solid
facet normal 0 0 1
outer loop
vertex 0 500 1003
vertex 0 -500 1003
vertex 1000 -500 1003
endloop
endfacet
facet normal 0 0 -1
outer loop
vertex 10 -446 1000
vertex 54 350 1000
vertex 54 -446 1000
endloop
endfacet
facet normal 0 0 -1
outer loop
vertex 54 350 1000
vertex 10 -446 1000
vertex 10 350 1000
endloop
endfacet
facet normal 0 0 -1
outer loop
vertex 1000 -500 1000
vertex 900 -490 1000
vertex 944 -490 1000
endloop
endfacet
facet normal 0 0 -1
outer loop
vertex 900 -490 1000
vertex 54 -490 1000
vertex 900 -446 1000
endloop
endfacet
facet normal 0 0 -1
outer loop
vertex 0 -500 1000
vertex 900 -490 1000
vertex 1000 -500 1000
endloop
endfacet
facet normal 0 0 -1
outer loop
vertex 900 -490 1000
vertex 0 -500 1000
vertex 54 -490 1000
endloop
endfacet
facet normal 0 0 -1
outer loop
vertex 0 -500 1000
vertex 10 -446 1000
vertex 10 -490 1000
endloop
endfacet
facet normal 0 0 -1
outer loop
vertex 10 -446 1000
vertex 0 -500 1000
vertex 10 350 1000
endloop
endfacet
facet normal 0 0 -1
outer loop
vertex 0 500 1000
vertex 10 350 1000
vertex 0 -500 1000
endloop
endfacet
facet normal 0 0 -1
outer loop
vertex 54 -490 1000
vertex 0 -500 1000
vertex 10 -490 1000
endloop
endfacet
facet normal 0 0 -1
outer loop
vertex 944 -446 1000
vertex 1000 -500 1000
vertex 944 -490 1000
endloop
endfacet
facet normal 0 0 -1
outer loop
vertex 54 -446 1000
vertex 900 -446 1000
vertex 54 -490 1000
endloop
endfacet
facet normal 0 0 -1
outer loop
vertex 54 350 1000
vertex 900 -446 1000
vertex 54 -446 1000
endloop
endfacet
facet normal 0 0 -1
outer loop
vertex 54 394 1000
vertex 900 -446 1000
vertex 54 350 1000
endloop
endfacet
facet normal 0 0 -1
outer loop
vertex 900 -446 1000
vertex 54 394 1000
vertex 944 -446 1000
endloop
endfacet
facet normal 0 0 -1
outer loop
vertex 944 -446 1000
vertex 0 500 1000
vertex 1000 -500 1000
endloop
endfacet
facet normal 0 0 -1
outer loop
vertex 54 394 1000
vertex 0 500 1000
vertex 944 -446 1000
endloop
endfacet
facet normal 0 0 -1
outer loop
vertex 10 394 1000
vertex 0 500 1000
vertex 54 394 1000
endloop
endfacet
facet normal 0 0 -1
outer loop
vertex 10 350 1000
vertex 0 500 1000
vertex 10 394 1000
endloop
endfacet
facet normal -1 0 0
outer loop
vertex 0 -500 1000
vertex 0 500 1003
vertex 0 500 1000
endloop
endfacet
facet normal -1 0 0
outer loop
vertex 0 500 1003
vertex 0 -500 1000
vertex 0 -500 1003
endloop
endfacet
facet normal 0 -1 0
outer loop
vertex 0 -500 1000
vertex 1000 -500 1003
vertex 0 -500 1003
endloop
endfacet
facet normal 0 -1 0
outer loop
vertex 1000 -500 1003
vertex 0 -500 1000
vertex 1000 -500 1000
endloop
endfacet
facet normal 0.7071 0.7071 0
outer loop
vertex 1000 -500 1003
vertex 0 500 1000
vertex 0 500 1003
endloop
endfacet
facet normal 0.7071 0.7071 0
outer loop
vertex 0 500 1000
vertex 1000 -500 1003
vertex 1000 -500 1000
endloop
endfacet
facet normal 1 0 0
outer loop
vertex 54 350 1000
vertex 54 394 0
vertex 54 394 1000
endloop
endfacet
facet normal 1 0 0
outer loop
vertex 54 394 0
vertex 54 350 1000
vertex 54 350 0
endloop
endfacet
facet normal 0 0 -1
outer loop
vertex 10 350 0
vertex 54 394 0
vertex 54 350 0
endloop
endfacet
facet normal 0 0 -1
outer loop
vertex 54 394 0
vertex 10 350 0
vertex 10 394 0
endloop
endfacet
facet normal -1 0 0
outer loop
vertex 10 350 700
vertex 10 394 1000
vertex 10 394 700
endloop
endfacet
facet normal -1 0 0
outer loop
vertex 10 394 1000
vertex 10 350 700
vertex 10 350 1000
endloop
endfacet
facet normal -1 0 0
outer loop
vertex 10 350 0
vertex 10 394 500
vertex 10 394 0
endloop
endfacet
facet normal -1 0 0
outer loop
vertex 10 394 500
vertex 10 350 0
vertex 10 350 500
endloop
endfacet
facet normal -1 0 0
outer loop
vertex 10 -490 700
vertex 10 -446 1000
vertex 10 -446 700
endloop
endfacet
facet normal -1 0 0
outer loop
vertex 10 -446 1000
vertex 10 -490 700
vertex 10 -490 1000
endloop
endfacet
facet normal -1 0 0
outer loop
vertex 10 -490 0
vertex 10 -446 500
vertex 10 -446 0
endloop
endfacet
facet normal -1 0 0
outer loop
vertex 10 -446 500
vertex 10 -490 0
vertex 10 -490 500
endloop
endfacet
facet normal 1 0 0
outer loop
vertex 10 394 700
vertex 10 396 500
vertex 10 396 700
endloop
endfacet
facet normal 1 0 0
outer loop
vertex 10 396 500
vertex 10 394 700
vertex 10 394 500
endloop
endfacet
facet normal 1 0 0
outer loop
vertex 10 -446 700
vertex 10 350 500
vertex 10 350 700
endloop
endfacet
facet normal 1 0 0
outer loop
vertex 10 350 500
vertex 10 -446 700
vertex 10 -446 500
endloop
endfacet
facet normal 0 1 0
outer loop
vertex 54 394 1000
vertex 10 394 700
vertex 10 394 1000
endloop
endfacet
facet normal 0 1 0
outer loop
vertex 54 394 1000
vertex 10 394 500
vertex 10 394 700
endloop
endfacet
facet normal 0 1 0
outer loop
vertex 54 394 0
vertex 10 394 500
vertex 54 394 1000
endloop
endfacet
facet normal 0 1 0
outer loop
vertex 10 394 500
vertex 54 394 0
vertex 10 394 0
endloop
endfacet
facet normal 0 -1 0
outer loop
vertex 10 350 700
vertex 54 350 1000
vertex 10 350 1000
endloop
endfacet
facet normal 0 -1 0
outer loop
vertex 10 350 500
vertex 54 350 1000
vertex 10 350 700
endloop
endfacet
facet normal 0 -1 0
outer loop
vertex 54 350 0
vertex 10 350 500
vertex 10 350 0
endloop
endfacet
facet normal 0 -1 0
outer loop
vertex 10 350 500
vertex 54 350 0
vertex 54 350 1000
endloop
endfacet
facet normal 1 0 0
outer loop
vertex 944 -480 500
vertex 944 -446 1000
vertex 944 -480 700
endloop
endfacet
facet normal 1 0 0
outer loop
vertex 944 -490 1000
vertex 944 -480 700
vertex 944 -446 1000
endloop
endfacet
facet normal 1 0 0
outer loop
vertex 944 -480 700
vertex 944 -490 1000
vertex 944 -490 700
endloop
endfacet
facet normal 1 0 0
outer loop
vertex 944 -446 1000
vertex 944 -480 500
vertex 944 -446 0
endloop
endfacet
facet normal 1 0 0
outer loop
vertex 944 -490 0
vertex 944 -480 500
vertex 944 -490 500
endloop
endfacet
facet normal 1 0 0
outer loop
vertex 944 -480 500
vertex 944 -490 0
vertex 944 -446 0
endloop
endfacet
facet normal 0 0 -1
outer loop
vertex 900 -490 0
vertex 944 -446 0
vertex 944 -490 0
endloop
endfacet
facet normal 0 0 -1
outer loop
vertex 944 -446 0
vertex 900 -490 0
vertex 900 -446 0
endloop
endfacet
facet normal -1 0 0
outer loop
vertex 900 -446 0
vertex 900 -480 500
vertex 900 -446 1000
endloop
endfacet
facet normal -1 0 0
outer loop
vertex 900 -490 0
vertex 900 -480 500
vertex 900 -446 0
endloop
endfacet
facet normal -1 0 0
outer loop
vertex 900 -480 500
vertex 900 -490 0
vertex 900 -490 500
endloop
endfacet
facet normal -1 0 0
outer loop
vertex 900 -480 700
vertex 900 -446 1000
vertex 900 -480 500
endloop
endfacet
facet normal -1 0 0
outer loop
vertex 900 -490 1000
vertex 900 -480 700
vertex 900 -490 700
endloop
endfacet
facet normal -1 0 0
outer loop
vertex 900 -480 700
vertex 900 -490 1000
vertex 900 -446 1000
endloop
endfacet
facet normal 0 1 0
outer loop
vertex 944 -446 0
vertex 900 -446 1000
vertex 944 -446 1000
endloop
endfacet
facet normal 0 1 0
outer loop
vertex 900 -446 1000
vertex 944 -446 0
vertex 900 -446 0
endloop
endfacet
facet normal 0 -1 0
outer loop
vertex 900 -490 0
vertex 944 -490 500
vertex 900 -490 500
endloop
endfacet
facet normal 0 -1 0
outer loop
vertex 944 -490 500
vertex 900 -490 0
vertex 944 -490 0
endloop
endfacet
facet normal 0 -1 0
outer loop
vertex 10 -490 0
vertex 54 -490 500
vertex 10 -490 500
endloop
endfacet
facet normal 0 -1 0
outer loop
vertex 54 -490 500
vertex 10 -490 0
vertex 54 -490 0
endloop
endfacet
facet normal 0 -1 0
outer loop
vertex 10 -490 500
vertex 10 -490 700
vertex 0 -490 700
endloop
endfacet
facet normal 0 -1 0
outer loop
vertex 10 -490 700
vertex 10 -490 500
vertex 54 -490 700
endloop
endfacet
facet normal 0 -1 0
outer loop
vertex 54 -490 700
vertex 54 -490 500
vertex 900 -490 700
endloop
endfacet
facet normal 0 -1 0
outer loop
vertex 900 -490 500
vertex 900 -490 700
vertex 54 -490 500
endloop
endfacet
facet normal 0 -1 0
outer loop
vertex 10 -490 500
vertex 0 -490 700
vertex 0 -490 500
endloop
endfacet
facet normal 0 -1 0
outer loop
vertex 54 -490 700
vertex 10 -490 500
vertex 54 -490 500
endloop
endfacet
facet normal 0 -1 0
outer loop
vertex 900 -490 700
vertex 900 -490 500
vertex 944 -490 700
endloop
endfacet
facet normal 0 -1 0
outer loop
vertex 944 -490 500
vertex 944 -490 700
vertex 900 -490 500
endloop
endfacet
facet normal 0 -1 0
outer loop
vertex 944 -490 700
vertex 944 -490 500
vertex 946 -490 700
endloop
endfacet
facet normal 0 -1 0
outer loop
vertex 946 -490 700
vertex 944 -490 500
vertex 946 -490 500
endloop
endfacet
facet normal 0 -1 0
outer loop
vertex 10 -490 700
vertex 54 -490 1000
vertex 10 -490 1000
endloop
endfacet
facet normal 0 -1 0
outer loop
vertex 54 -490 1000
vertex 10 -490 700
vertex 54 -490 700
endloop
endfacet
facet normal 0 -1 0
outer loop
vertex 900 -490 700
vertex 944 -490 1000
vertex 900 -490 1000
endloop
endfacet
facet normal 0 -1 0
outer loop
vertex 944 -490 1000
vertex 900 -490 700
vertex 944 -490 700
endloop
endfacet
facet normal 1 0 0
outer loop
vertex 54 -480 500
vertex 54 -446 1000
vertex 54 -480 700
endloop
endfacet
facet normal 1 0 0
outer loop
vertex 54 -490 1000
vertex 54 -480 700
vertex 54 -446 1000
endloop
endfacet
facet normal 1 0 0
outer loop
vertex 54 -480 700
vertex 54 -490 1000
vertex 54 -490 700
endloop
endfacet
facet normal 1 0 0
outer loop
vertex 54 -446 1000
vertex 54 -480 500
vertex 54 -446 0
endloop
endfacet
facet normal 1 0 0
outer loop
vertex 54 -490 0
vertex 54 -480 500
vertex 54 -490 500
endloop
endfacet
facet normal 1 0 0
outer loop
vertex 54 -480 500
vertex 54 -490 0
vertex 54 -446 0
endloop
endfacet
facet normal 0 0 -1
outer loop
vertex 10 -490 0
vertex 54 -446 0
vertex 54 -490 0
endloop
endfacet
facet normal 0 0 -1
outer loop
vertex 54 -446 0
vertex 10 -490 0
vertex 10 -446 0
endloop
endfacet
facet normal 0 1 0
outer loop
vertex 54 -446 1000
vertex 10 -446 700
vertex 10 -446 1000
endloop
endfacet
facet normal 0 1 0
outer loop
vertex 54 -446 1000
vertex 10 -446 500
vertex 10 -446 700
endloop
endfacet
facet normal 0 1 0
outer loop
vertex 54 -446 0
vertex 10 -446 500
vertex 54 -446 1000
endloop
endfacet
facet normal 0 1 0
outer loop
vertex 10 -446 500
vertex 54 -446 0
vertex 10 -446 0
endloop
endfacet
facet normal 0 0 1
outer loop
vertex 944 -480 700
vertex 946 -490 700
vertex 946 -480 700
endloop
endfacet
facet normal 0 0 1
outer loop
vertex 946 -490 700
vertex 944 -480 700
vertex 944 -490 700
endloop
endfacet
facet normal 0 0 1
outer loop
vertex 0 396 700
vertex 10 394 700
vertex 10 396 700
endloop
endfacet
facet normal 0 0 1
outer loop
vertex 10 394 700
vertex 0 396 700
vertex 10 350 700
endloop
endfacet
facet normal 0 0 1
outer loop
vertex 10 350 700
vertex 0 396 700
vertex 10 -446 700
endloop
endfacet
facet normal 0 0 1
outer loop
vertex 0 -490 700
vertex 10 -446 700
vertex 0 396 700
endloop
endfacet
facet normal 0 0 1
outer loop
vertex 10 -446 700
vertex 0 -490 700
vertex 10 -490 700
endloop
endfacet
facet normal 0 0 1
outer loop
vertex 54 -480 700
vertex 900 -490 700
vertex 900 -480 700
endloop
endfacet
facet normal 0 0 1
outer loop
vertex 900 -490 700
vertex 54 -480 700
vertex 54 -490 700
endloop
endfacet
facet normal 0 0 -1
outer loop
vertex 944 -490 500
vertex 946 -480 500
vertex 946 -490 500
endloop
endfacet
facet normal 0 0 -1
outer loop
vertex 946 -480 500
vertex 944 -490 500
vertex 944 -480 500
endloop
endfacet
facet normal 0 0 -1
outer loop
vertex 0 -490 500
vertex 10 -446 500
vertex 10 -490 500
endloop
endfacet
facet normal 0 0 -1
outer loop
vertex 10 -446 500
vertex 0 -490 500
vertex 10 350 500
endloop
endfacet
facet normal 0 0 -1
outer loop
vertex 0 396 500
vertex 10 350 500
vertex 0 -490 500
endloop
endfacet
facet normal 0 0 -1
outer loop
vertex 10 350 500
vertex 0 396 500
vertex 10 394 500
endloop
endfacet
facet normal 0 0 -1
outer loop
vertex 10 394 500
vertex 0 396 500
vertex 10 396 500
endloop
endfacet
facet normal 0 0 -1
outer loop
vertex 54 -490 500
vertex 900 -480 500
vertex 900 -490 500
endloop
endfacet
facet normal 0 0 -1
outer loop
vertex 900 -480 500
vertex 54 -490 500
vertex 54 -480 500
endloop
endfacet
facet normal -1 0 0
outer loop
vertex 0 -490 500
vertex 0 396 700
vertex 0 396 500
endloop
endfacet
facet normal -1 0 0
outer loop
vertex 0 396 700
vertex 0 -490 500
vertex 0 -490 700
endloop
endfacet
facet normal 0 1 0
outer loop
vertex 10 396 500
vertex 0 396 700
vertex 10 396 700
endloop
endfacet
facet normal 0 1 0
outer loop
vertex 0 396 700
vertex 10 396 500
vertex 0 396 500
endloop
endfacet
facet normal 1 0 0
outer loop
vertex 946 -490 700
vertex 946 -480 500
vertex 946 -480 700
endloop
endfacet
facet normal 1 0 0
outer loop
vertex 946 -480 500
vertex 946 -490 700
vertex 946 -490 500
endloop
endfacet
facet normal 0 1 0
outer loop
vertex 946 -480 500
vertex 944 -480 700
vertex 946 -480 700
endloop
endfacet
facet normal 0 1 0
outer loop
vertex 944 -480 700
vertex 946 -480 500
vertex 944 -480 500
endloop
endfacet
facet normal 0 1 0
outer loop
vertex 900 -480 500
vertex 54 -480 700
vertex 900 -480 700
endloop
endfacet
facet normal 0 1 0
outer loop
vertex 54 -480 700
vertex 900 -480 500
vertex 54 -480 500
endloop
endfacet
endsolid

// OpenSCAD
H=1000;
D=1000;
W=1000;

module room() {
	color([0.7, 0.7, 0.6, 0.3]) render(convexity=5) difference() {
		translate(-[1000, 1000, 300]) cube([3000, 2500, 2000]);
		cube([6000, 2000, 6000]);
		translate([0,-500,0]) cube([1150, 2000, 3000]);
		translate([100,-2000,1000]) cube([950, 2500, 3000]);
	}
}

module table() {
	color([0.9, 0.9, 0.5]) intersection() {
		translate([0,-500,H]) cube([D,W, 3]);
		translate([0,500,-10]) rotate([0,0,270-atan2(W,D)]) cube([2000, 2000, 2000]);
	}
	translate([10,W-650,0]) cube([44,44,H]);
	translate([D-100,-490,0]) cube([44,44,H]);
	translate([10,-490,0]) cube([44,44,H]);
	color([0.9, 0.9, 0.5]) translate([0, -490, H/2]) cube([10, W-44-70, 200]);
	color([0.9, 0.9, 0.5]) translate([0, -490, H/2]) cube([D-44-10, 10, 200]);

}

%room();
table();
